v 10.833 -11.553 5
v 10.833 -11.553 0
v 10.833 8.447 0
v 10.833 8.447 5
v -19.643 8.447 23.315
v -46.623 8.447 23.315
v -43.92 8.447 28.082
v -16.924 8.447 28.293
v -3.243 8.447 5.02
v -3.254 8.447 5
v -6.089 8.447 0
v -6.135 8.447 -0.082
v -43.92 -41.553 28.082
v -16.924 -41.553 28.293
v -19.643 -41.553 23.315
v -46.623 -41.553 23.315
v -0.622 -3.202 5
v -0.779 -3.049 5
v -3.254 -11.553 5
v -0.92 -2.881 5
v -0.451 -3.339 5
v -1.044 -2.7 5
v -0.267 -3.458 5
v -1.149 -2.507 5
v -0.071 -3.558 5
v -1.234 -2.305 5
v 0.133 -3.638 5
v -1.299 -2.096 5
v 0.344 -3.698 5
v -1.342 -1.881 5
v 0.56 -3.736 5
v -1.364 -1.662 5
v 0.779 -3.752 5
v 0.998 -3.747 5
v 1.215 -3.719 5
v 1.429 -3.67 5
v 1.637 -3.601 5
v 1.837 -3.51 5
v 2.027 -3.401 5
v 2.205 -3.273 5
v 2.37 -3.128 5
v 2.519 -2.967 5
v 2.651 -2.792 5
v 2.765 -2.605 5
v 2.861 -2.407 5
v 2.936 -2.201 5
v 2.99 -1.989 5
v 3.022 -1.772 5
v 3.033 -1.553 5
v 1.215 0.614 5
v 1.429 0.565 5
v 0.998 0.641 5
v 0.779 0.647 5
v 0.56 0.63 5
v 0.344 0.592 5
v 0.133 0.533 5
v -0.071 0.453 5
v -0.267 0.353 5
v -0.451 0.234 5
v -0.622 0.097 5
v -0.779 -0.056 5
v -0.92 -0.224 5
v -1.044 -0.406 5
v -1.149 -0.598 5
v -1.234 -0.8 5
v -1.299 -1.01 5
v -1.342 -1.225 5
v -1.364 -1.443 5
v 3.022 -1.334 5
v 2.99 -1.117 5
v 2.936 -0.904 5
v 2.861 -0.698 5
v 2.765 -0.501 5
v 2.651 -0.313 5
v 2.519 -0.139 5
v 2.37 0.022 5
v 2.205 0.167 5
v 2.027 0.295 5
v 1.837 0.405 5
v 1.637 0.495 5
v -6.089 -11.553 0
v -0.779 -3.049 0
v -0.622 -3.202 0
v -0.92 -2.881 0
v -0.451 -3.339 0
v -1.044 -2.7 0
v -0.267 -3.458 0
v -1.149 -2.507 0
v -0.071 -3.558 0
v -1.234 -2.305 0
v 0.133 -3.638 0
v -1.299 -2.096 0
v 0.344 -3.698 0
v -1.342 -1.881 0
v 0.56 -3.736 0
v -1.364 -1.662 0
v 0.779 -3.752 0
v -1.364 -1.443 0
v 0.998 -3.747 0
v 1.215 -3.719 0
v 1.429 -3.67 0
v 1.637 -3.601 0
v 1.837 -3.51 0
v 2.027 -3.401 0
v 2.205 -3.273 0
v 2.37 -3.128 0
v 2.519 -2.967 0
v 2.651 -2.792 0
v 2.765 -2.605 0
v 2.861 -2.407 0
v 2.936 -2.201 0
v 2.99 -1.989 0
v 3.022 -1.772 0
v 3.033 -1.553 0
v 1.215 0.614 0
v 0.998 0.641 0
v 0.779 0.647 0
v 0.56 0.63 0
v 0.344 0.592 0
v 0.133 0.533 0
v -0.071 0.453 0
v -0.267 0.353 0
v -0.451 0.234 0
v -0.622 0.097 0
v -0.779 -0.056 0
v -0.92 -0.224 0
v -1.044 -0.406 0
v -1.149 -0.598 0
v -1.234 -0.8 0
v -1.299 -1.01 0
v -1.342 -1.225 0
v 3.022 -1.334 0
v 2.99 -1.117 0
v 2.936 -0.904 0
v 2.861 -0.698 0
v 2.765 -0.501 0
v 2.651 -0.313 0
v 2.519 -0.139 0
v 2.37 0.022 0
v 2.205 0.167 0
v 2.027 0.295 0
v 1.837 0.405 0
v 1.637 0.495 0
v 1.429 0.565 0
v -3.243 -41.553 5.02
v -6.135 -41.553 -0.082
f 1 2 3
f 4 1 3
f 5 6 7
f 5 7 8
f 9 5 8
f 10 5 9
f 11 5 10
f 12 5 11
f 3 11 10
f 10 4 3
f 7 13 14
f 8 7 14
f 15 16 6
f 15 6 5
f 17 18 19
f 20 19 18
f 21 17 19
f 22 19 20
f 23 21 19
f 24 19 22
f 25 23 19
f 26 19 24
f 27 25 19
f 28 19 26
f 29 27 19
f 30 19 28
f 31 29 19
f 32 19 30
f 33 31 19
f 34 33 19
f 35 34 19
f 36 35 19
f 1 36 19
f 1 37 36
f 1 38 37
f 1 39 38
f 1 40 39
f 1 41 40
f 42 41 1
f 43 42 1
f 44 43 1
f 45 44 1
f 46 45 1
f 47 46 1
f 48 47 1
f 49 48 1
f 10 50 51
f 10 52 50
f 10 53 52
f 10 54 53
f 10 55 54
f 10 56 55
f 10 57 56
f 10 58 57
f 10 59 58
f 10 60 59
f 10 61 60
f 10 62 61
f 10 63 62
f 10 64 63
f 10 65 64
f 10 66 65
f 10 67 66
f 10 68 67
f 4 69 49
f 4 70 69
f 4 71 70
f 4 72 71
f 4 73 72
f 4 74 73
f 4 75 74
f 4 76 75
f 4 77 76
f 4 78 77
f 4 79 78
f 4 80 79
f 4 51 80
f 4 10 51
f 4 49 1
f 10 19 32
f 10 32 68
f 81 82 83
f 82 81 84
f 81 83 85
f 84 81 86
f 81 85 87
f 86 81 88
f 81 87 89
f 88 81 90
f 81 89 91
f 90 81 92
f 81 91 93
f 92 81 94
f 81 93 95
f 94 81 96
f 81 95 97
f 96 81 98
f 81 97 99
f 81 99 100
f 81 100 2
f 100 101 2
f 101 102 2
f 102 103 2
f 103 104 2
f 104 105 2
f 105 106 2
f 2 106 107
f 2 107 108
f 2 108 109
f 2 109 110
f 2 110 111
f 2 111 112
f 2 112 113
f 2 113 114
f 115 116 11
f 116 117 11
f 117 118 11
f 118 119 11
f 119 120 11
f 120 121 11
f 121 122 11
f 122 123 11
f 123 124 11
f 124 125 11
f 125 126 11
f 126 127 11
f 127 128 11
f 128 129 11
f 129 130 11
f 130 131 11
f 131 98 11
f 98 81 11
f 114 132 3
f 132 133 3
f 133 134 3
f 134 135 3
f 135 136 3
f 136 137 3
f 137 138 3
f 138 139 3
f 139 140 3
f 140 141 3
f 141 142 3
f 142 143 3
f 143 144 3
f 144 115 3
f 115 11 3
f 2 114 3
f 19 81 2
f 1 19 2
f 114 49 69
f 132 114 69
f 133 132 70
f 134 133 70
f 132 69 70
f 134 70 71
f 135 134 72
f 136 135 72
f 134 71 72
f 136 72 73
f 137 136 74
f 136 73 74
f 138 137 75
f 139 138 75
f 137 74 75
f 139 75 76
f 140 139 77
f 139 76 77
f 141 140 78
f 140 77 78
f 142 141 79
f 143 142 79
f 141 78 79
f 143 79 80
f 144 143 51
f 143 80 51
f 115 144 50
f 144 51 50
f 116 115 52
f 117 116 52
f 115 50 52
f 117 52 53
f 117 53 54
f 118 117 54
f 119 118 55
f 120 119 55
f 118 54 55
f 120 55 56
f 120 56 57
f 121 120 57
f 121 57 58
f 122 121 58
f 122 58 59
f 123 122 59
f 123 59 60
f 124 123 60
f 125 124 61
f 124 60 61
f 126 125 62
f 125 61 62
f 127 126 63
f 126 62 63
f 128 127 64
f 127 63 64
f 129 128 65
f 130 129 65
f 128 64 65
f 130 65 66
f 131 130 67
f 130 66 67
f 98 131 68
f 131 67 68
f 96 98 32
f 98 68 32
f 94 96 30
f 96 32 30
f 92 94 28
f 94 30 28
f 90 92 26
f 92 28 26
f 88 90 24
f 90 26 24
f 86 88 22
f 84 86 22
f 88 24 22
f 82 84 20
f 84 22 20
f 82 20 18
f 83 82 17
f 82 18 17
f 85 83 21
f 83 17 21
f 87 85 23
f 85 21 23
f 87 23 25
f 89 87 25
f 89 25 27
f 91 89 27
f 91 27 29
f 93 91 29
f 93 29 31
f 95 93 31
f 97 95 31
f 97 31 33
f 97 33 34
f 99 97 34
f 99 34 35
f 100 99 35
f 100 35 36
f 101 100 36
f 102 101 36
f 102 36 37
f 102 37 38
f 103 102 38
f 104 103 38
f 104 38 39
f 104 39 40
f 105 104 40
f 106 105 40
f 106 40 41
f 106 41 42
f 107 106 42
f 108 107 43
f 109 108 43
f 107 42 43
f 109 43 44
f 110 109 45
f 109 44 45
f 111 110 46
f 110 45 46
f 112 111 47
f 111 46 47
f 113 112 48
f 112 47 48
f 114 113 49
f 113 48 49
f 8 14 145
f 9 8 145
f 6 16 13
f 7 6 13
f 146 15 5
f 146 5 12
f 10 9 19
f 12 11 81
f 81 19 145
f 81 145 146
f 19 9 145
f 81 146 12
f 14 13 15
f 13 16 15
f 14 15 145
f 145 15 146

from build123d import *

# Parameters (mm, degrees)
ESQUISSE3_W             = 20
ESQUISSE3_H             = 20
BOSS_EXTRU_2_DEPTH      = 5
ESQUISSE5_R             = 2.2
ENL_V_MAT_EXTRU_2_DEPTH = 5
BOSS_EXTRU_4_DEPTH      = 1
BOSS_EXTRU_4_DEPTH_BACK = 50
ENL_V_MAT_EXTRU_3_DEPTH = 52
ESQUISSE17_W            = 44.772761967
ESQUISSE17_H            = 32.67201549
ENL_V_MAT_EXTRU_4_DEPTH = 1


with BuildPart() as part:
    # Esquisse3 → Boss.-Extru.2 (new body)
    with BuildSketch(Plane.XY):
        with Locations((0.833384448, -1.552723646)):
            Rectangle(ESQUISSE3_W, ESQUISSE3_H)
    extrude(amount=BOSS_EXTRU_2_DEPTH)

    # Esquisse5 → Enlèv. mat.-Extru.2 (cut)
    with BuildSketch(Plane.XY.offset(5)):
        with Locations((0.833384448, -1.552723646)):
            Circle(ESQUISSE5_R)
    extrude(amount=-ENL_V_MAT_EXTRU_2_DEPTH, mode=Mode.SUBTRACT)

    # Esquisse15 → Boss.-Extru.4 (add, two sides: drawn at the far end of the back side and taken through both)
    with BuildSketch(Plane(origin=(0, 8.447276354, 0), x_dir=(1, 0, 0), z_dir=(0, 1, 0)).offset(-BOSS_EXTRU_4_DEPTH_BACK)):
        Polygon((-16.923746628, -28.293399859), (-3.242841841, -5.019846719), (-16.557877703, 18.464940943), (-43.553818352, 18.676175465), (-57.234723139, -4.597377675), (-43.919687277, -28.082165337), align=None)
    extrude(amount=BOSS_EXTRU_4_DEPTH + BOSS_EXTRU_4_DEPTH_BACK)

    # Esquisse16 → Enlèv. mat.-Extru.3 (cut)
    with BuildSketch(Plane(origin=(0, 9.447276354, 0), x_dir=(1, 0, 0), z_dir=(0, 1, 0))):
        Polygon((-3.971698256, 3.828685124), (-19.643043748, 30.972251739), (-50.985734731, 30.972251739), (-66.657080223, 3.828685124), (-50.985734731, -23.314881491), (-19.643043748, -23.314881491), align=None)
    extrude(amount=-ENL_V_MAT_EXTRU_3_DEPTH, mode=Mode.SUBTRACT)

    # Esquisse17 → Enlèv. mat.-Extru.4 (cut)
    with BuildSketch(Plane(origin=(0, 9.447276354, 0), x_dir=(1, 0, 0), z_dir=(0, 1, 0))):
        with Locations((-25.155039142, -14.317707157)):
            Rectangle(ESQUISSE17_W, ESQUISSE17_H)
    extrude(amount=-ENL_V_MAT_EXTRU_4_DEPTH, mode=Mode.SUBTRACT)


solid = part.part
